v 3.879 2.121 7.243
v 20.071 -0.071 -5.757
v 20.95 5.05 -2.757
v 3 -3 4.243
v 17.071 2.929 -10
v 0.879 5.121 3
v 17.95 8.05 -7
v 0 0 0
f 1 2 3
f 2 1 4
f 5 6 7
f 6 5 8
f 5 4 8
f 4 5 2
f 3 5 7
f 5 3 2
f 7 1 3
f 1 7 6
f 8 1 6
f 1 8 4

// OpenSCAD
// 🔴 scad.ts REFUSES rotate(a, v) BY NAME and still emits the subtree UNROTATED.
// A refusal that keeps geometry is not a refusal; this case is here to measure it.
rotate(45, [1, 1, 0]) cube([20, 6, 6]);
